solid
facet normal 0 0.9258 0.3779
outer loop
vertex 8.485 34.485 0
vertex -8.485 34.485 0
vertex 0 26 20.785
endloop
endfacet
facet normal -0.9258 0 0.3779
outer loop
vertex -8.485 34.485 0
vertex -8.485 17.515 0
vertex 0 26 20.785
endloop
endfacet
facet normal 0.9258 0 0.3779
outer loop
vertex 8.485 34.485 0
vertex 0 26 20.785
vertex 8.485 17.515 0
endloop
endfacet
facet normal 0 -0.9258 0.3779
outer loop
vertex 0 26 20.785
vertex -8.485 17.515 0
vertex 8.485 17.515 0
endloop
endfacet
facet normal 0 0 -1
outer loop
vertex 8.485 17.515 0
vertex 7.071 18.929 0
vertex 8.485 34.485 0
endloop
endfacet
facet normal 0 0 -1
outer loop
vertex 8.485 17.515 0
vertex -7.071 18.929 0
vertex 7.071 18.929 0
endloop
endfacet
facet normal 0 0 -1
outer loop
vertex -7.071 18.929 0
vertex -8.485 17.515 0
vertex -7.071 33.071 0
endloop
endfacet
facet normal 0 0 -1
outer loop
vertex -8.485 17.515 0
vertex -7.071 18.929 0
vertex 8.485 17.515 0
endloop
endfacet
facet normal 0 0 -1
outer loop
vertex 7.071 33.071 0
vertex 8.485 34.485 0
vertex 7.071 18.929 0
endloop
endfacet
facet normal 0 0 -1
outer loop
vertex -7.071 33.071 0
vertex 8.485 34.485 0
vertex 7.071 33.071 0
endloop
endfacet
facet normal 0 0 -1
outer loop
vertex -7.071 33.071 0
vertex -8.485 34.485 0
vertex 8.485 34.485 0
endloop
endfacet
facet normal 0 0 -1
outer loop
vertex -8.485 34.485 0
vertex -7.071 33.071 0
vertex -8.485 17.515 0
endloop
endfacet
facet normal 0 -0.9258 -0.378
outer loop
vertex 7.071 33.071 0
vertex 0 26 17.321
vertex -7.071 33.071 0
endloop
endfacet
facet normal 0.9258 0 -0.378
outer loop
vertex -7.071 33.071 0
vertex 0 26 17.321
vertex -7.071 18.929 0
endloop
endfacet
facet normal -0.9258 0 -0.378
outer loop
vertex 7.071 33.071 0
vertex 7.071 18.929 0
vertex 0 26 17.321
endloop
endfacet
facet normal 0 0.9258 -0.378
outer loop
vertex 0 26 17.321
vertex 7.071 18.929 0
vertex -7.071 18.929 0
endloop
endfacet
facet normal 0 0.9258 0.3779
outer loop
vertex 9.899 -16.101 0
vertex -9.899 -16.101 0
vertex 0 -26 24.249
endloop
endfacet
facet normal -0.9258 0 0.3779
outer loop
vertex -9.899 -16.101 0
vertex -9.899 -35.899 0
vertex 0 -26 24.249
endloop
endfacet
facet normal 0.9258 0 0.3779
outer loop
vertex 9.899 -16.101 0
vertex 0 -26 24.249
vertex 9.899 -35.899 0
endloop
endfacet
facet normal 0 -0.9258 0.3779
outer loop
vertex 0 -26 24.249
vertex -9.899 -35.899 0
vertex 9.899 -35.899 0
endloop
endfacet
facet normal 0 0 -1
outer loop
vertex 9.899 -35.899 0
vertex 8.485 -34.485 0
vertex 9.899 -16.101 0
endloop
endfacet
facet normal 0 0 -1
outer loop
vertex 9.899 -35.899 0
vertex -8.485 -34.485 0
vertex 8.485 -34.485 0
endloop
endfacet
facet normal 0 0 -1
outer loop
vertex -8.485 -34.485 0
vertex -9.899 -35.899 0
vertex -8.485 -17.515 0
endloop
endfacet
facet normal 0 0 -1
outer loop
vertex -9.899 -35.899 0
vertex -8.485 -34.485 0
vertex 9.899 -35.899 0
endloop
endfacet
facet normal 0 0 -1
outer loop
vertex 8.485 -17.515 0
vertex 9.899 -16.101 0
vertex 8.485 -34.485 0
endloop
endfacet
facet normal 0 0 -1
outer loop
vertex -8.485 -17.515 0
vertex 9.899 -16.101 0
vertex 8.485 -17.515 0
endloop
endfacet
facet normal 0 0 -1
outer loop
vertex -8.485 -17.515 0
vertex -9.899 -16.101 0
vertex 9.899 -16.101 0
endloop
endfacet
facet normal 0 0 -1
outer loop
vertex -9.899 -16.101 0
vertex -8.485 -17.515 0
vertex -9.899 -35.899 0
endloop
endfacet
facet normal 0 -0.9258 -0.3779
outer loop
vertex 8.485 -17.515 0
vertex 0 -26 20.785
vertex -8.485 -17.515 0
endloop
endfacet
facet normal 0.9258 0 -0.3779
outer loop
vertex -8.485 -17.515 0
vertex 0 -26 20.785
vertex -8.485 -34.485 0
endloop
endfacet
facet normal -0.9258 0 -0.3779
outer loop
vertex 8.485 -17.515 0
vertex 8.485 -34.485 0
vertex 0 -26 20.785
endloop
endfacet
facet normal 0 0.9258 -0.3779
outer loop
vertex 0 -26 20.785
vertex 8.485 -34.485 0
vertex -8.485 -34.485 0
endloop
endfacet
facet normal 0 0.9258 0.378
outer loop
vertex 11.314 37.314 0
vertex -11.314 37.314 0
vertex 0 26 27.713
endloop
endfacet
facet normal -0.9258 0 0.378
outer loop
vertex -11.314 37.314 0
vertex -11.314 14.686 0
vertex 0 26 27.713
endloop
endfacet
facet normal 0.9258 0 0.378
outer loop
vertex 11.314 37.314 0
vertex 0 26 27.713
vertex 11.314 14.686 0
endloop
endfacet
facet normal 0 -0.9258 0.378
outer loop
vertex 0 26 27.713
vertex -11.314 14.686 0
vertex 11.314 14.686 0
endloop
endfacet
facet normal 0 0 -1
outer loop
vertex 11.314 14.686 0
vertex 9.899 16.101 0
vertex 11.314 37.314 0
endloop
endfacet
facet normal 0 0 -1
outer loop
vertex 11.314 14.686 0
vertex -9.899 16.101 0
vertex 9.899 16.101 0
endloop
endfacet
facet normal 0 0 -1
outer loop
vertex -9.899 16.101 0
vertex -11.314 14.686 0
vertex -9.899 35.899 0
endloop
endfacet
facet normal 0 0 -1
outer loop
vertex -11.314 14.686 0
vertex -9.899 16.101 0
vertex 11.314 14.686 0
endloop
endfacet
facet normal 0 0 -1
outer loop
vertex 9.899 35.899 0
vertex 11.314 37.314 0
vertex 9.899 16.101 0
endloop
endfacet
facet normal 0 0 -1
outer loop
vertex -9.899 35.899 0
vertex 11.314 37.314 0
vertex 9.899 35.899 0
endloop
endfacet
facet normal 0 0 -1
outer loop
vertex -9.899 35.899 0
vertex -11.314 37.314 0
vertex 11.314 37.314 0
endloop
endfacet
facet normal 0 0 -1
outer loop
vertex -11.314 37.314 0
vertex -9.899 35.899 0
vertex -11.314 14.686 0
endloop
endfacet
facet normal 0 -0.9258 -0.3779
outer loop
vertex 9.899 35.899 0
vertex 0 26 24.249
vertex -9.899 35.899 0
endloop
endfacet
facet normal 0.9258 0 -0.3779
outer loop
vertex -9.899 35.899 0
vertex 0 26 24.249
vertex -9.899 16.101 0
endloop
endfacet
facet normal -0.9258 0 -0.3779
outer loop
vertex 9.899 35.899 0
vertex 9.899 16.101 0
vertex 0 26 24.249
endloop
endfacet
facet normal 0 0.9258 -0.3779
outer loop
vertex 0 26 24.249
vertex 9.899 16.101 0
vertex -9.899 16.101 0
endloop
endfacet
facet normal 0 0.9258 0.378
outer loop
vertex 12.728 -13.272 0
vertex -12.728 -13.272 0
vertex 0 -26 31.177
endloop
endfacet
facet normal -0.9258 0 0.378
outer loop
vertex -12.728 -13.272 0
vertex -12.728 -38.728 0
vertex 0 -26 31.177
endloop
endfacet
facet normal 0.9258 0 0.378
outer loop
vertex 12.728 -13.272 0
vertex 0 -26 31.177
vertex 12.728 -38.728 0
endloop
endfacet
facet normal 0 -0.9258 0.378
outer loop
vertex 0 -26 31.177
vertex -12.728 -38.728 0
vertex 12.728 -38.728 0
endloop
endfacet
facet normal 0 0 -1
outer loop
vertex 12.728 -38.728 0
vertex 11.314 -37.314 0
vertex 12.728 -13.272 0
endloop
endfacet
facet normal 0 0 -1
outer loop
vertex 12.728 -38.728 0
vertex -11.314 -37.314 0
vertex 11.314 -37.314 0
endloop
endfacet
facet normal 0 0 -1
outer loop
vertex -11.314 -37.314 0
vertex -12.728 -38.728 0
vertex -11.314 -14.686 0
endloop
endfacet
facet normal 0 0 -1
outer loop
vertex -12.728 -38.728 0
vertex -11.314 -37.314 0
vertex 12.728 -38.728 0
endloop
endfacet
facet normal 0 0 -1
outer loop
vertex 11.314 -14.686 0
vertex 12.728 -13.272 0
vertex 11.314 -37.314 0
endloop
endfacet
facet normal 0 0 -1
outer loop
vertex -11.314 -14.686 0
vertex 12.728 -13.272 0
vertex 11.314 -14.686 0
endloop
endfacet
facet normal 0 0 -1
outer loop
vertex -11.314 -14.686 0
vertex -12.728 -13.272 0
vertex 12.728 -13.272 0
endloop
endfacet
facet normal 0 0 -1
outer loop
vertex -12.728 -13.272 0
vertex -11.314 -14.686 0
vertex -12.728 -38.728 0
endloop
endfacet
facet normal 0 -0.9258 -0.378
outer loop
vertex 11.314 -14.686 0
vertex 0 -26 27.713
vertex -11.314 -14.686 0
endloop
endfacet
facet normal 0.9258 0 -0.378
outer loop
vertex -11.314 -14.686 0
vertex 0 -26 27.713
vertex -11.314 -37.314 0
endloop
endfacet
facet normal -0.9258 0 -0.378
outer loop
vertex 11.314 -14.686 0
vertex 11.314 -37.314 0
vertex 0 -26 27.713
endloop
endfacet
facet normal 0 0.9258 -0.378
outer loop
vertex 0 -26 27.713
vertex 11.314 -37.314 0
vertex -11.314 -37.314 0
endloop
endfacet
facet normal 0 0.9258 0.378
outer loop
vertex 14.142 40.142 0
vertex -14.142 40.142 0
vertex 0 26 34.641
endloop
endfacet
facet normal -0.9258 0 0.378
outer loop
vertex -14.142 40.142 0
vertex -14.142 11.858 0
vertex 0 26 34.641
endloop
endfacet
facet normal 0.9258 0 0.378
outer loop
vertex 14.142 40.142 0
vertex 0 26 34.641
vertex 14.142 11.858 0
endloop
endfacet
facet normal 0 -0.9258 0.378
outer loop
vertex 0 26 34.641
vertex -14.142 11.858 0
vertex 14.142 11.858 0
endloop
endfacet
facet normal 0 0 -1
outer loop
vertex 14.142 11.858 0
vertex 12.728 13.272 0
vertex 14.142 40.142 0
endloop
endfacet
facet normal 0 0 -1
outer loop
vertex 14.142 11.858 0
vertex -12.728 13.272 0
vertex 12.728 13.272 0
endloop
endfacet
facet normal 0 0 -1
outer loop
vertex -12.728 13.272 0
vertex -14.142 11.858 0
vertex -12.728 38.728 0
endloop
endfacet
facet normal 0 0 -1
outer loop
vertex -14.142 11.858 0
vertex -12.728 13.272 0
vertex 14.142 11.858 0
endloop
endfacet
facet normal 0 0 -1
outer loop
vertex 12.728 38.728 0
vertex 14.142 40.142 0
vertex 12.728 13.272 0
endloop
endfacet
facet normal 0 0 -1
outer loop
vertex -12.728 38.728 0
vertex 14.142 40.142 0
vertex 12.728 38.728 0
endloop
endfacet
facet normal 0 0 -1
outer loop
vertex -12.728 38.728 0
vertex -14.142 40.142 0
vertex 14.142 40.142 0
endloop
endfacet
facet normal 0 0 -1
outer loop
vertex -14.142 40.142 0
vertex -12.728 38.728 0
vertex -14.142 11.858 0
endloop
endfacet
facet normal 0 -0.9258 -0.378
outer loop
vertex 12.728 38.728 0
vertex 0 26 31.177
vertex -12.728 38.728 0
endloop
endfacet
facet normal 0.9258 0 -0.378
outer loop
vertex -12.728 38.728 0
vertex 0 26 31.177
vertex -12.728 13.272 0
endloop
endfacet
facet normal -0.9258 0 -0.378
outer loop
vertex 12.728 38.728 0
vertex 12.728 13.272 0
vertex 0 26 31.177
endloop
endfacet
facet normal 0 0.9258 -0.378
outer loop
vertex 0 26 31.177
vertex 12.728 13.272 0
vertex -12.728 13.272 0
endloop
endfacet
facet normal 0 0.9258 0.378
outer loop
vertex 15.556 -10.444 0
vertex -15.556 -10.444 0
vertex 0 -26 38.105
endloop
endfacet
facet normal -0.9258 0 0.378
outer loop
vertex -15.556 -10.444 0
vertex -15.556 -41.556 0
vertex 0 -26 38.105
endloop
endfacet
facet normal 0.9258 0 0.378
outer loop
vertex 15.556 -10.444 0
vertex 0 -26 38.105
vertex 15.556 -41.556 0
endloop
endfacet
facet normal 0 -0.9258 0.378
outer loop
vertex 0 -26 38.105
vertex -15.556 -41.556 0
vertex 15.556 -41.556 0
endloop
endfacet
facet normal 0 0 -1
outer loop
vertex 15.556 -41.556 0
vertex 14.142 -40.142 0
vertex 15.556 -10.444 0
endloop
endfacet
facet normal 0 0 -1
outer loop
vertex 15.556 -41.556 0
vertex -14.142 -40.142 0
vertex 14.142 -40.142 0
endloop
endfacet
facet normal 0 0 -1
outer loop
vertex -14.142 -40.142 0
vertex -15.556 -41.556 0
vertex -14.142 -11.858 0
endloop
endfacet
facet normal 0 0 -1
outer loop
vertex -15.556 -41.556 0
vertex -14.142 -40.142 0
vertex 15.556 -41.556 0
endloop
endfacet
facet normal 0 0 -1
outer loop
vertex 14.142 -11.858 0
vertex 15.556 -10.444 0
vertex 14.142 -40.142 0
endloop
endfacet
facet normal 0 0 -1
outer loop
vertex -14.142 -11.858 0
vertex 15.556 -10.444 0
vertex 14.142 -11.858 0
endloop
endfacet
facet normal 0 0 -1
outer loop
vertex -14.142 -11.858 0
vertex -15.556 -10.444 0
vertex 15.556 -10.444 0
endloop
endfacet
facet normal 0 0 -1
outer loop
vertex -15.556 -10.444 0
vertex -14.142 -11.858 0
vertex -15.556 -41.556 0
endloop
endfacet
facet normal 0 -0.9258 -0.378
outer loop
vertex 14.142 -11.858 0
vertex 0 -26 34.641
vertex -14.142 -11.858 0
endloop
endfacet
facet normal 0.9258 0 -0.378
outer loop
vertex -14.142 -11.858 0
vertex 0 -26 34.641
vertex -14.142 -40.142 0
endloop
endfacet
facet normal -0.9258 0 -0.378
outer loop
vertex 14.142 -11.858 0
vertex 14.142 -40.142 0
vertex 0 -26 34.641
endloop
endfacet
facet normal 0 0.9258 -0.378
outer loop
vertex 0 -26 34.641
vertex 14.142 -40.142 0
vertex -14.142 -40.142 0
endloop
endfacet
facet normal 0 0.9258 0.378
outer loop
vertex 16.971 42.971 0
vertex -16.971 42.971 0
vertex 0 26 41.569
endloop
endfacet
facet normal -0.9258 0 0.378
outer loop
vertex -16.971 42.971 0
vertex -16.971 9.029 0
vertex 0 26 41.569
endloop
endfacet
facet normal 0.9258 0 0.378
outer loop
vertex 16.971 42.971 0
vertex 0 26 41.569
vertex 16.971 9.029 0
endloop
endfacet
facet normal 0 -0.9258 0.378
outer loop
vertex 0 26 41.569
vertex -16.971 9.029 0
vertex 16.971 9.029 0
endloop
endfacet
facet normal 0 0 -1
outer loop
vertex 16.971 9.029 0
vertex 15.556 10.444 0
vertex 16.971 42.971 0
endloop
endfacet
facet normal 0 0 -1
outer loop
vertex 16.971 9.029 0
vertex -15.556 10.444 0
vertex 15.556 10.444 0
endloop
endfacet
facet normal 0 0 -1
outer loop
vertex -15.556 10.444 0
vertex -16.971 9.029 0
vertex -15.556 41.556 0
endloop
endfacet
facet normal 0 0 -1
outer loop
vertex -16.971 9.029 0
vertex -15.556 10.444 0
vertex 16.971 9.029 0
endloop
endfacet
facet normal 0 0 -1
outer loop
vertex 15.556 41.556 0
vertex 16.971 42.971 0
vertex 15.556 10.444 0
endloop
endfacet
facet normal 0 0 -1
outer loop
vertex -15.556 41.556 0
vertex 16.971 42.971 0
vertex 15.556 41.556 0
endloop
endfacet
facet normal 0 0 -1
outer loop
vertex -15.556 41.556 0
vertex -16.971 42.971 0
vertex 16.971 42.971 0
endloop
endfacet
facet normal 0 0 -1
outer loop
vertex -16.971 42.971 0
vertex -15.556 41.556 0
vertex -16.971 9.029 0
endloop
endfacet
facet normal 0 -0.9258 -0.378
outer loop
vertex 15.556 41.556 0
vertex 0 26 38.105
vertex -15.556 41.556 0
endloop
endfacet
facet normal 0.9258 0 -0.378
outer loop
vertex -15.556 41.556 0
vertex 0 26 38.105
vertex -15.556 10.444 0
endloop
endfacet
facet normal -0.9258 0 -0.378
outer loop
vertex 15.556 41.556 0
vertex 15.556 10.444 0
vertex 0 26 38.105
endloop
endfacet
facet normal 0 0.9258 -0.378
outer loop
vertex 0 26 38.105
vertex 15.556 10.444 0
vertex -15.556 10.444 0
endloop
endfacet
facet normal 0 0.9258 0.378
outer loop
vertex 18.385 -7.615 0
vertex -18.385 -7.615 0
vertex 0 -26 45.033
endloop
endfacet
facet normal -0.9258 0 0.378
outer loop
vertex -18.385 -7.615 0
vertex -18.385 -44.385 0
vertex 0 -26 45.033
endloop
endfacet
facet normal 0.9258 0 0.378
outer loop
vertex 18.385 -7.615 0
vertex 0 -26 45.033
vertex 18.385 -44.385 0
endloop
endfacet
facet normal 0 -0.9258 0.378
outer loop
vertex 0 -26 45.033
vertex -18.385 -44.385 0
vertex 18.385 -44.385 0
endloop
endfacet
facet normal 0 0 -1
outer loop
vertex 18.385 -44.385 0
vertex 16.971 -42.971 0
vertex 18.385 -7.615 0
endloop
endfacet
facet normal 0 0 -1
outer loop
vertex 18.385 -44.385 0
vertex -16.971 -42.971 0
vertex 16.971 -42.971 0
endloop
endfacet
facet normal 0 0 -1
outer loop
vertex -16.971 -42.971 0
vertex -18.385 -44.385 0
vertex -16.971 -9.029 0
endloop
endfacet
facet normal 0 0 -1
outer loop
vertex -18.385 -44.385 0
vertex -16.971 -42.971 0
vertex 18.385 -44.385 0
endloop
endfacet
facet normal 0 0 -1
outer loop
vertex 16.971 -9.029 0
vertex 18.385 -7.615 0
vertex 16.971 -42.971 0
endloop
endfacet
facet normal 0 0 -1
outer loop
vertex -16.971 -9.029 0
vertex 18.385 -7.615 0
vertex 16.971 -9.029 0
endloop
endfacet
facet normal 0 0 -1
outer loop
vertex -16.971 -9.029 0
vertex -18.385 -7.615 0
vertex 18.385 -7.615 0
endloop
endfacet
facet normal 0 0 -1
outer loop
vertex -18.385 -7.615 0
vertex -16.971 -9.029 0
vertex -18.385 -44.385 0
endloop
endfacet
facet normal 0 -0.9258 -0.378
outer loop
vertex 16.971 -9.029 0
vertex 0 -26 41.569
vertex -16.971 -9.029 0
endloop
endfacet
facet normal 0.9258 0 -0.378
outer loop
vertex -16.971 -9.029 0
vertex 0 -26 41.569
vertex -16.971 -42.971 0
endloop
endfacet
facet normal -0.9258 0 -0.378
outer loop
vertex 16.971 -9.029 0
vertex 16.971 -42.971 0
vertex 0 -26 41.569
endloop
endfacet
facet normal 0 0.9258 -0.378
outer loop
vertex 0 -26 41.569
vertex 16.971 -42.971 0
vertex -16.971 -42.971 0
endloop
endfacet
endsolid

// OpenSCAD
// Copyright 2018 Michael K Johnson
// Use allowed under Attribution 4.0 International (CC BY 4.0) license terms
// https://creativecommons.org/licenses/by/4.0/legalcode
// Print a set of pyramids for towers of hanoi

// Number of pyramids to print
count=8; // [3:20]
// Number of sides for each pyramid
sides=4; // [3:10]
// Width of circumsribing cylinder around base of smallest pyramid
base=20;
// Thickness of pyramid shells
thickness=2;
// External angle of pyramid side
angle=30; // [20:45]

module pyramid(r, inner=false) {
    height=r*tan(90-angle);
    difference() {
        // change this rotation to parallel adjacent sides regardless of number of sides
        rotate([0, 0, 180/sides])
            cylinder(r1=r, r2=0, h=height, $fn=sides);
        if (!inner) {
            pyramid(r=r-thickness, inner=true);
        }
    }
}
module stack() {
    max_r=base/2 + thickness*count;
    for (i=[1:count]) {
        Y=max_r * ((i%2)?1:-1);
        translate([0, Y, 0]) pyramid(base/2 + thickness*i);
    }
}
module preview_stack() {
    X=base + 2*thickness*count;
    for (i=[1:count]) {
        Z=2*(count-i)*thickness*tan(90-angle);
        translate([-X, 0, Z]) pyramid(base/2 + thickness*i);
    }
    
}
%preview_stack();
stack();
